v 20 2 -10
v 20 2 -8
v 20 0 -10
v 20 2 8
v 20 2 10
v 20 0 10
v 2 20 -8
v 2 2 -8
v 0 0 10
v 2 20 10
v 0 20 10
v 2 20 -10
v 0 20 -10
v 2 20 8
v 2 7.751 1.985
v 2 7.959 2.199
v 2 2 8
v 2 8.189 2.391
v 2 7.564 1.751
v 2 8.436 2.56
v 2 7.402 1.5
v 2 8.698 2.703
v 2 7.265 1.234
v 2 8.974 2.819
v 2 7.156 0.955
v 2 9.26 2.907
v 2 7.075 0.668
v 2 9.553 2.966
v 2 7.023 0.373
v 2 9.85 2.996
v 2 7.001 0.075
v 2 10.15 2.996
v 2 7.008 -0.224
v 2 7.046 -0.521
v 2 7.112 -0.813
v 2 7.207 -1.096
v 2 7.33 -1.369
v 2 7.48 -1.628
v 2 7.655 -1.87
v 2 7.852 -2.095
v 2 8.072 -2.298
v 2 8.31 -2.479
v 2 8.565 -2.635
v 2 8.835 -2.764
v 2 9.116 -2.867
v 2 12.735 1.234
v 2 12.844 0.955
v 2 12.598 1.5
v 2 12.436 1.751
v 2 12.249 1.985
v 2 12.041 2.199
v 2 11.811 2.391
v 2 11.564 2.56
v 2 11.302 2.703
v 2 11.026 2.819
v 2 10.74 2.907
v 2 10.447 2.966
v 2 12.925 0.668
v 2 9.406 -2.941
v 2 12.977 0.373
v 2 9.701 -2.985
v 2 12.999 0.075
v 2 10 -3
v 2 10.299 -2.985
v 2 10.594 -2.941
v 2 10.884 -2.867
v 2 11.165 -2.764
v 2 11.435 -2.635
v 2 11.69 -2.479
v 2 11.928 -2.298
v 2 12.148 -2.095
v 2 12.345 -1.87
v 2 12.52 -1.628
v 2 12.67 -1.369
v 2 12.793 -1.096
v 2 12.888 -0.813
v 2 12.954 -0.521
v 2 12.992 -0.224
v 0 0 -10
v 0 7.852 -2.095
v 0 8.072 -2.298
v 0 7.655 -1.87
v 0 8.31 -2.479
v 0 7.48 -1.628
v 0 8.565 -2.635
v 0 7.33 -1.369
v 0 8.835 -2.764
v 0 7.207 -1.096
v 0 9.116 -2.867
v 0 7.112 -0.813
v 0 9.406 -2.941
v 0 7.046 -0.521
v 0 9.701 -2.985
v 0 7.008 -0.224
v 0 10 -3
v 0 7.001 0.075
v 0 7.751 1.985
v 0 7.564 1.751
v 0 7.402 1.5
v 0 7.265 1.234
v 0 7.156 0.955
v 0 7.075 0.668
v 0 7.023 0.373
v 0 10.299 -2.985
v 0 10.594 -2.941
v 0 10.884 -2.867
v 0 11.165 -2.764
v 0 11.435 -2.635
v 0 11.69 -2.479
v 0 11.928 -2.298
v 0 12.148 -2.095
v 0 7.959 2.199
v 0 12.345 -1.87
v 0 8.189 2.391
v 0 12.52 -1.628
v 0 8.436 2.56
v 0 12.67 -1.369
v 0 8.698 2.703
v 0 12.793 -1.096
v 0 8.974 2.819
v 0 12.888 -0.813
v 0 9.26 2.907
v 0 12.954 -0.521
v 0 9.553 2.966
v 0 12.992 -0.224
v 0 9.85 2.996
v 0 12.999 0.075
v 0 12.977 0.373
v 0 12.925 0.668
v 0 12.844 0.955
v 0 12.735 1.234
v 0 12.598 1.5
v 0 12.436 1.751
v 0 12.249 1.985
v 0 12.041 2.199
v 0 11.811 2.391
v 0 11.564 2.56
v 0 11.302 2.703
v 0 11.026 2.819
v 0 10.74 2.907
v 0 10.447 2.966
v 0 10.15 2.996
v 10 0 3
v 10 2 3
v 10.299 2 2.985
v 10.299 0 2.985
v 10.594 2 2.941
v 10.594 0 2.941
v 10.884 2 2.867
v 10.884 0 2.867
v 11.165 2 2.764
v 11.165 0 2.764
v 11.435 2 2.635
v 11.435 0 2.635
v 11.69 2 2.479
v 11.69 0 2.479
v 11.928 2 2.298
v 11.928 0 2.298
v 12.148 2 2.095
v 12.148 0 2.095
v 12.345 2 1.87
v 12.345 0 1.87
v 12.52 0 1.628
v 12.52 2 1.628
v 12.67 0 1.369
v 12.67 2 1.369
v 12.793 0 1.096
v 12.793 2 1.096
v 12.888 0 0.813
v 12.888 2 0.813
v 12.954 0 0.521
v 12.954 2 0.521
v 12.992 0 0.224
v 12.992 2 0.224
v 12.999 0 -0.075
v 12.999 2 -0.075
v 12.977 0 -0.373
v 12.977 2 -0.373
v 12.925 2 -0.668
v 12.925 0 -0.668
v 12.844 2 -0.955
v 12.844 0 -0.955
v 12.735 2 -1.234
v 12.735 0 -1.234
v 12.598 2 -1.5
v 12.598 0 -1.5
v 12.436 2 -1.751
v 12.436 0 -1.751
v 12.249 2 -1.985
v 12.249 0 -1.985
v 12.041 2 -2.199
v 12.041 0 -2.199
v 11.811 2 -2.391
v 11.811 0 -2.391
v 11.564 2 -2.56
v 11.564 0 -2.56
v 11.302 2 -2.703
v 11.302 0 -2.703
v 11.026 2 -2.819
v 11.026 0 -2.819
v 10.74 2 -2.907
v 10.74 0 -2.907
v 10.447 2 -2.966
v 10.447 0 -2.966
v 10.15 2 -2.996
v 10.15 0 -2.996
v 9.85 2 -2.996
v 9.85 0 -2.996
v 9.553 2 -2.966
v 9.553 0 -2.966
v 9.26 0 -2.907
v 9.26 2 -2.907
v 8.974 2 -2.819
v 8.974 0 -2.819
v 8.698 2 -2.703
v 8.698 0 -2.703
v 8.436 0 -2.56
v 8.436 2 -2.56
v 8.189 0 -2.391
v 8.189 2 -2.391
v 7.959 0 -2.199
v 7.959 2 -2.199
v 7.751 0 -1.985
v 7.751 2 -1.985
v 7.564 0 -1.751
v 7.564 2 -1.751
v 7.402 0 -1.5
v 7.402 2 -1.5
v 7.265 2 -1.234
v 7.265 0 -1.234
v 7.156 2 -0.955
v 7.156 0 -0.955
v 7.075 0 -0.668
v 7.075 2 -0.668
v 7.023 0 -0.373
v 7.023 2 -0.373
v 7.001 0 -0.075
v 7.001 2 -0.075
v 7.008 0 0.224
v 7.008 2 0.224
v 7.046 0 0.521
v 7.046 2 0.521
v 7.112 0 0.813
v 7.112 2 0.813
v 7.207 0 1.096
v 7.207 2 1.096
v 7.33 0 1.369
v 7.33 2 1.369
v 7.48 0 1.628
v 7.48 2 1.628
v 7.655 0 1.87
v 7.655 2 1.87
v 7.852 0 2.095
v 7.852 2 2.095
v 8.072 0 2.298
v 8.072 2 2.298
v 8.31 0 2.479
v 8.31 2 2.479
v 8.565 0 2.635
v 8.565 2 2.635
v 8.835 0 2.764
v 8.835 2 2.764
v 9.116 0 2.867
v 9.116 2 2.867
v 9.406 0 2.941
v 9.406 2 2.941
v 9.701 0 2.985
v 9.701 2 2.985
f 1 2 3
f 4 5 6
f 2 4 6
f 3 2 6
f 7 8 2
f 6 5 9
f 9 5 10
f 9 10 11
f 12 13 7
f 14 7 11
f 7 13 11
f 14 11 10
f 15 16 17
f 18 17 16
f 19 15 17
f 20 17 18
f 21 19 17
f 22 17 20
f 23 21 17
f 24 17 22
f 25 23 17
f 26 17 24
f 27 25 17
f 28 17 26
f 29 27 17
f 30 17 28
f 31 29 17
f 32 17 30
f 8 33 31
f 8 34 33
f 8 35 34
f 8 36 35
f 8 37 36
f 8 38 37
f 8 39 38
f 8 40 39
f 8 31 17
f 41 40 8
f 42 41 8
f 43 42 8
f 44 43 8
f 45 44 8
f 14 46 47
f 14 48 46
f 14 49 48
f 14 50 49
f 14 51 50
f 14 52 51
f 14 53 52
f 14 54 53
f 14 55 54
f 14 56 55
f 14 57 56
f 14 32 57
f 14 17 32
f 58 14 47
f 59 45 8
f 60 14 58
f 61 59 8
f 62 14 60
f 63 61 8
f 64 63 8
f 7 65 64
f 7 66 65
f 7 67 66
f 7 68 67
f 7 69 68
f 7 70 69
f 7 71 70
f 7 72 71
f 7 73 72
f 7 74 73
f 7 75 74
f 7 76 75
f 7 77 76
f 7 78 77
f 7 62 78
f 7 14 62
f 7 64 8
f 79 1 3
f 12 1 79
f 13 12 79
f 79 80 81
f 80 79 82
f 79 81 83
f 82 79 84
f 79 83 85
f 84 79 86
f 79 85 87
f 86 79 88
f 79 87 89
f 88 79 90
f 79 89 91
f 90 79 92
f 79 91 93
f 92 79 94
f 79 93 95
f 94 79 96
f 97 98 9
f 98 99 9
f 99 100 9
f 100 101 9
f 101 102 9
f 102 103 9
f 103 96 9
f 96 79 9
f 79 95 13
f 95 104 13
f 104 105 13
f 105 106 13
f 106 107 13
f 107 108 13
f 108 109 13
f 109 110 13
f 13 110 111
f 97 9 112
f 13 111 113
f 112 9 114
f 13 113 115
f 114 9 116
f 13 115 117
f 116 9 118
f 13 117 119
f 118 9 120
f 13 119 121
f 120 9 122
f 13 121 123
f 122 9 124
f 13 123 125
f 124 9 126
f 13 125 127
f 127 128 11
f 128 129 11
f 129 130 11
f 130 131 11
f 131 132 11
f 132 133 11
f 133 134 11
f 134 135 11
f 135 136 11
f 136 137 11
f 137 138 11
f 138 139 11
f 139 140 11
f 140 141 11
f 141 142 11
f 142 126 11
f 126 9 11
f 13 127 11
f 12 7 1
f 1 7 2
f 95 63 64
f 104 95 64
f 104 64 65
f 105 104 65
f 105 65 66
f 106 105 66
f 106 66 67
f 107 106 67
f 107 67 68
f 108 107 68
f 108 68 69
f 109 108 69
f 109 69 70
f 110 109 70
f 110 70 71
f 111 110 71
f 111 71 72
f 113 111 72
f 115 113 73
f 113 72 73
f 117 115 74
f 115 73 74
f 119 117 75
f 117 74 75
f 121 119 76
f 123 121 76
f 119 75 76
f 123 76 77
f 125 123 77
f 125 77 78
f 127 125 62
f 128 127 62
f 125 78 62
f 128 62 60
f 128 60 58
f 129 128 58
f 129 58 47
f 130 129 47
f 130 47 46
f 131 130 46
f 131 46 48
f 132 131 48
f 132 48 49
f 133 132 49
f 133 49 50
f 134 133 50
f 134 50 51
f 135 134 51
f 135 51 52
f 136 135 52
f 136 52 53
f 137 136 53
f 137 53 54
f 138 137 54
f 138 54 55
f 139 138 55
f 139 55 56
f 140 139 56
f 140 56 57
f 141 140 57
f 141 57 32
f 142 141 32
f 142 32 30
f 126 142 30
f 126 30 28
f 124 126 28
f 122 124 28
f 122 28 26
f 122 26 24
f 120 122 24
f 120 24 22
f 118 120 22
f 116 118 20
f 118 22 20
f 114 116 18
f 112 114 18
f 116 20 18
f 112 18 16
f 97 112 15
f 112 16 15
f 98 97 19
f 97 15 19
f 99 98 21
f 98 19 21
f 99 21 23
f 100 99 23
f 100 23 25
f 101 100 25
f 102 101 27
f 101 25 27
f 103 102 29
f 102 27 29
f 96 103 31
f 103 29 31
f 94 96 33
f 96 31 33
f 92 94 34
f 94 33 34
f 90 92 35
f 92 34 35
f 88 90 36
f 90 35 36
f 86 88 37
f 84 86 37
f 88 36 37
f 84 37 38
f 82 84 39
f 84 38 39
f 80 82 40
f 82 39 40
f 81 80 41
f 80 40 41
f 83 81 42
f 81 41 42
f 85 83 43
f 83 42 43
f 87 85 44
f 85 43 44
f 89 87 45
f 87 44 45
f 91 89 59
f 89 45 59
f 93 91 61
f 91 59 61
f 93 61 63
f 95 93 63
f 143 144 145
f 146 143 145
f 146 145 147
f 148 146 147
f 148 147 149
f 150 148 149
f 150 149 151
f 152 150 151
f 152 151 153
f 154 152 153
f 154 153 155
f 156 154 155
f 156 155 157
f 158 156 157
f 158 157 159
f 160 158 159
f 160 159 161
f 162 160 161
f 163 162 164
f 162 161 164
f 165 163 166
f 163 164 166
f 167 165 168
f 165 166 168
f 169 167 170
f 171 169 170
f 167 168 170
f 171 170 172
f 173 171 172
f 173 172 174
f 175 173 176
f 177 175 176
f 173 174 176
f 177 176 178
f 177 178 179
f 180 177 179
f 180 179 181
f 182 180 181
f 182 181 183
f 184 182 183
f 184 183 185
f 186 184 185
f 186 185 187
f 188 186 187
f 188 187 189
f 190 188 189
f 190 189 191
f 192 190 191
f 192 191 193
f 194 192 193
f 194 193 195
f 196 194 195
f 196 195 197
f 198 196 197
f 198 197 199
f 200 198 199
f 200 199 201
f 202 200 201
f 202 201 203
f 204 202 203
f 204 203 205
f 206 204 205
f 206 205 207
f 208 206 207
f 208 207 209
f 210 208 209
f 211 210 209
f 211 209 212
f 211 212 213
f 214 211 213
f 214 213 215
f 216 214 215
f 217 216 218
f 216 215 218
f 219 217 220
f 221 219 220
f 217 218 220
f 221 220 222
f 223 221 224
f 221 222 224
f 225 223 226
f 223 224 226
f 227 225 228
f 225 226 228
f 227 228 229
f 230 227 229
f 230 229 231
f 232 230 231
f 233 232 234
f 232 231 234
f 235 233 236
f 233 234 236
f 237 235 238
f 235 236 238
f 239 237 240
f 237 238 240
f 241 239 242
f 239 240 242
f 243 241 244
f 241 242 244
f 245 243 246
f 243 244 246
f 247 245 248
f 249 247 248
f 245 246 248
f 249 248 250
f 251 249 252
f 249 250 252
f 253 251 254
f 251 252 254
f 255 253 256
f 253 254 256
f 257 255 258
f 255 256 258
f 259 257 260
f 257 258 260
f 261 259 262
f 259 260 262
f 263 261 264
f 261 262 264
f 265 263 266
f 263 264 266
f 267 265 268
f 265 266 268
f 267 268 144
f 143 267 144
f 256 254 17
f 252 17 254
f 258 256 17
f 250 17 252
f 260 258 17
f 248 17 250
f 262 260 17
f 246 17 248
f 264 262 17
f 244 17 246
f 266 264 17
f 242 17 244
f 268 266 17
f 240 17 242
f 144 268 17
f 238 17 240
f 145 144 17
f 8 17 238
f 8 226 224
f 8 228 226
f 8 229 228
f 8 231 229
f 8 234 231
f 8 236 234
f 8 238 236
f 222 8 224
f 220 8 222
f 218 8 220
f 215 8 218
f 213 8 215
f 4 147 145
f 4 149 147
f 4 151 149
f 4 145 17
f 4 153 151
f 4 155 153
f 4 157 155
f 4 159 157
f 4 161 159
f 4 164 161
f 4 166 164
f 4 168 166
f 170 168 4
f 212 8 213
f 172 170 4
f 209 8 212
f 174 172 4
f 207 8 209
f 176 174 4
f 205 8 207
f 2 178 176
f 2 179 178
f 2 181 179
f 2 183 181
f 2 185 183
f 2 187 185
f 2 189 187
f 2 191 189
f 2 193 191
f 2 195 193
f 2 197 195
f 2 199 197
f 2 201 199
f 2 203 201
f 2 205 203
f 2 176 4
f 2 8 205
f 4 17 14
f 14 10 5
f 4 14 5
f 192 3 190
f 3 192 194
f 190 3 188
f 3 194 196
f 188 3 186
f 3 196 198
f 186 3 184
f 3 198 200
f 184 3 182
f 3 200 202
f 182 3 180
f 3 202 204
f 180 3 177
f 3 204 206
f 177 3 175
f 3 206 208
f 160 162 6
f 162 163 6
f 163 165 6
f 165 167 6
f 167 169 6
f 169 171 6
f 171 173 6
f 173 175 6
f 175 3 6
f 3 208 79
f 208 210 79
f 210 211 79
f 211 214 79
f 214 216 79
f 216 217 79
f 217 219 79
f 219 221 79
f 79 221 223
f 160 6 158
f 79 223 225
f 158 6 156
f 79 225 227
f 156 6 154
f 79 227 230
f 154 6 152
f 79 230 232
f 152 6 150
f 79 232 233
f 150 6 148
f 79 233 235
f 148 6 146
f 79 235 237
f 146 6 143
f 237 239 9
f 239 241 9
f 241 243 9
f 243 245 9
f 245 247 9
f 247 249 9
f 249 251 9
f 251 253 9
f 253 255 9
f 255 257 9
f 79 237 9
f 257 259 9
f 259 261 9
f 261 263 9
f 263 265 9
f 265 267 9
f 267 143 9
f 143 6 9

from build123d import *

# Parameters (mm, degrees)
BOSS_EXTRUDE1_DEPTH = 10
SKETCH2_W           = 18
SKETCH2_H           = 16
CUT_EXTRUDE1_DEPTH  = 18
SKETCH3_R           = 3
CUT_EXTRUDE2_DEPTH  = 20
SKETCH4_R           = 3
CUT_EXTRUDE3_DEPTH  = 20


with BuildPart() as part:
    # Sketch1 → Boss-Extrude1 (new, symmetric)
    with BuildSketch(Plane.XY):
        Polygon((20, 0), (0, 0), (0, 20), (2, 20), (20, 2), align=None)
    extrude(amount=BOSS_EXTRUDE1_DEPTH, both=True)

    # Sketch2 → Cut-Extrude1 (cut)
    with BuildSketch(Plane(origin=(0, 20, 0), x_dir=(1, 0, 0), z_dir=(0, 1, 0))):
        with Locations((11, 0)):
            Rectangle(SKETCH2_W, SKETCH2_H)
    extrude(amount=-CUT_EXTRUDE1_DEPTH, mode=Mode.SUBTRACT)

    # Sketch3 → Cut-Extrude2 (cut)
    with BuildSketch(Plane(origin=(2, 0, 0), x_dir=(0, 0, -1), z_dir=(1, 0, 0))):
        with Locations((0, 10)):
            Circle(SKETCH3_R)
    extrude(amount=-CUT_EXTRUDE2_DEPTH, mode=Mode.SUBTRACT)

    # Sketch4 → Cut-Extrude3 (cut)
    with BuildSketch(Plane(origin=(0, 2, 0), x_dir=(1, 0, 0), z_dir=(0, 1, 0))):
        with Locations(Location((10, 0, 0), (0, 0, 270))):
            Circle(SKETCH4_R)
    extrude(amount=-CUT_EXTRUDE3_DEPTH, mode=Mode.SUBTRACT)


solid = part.part
